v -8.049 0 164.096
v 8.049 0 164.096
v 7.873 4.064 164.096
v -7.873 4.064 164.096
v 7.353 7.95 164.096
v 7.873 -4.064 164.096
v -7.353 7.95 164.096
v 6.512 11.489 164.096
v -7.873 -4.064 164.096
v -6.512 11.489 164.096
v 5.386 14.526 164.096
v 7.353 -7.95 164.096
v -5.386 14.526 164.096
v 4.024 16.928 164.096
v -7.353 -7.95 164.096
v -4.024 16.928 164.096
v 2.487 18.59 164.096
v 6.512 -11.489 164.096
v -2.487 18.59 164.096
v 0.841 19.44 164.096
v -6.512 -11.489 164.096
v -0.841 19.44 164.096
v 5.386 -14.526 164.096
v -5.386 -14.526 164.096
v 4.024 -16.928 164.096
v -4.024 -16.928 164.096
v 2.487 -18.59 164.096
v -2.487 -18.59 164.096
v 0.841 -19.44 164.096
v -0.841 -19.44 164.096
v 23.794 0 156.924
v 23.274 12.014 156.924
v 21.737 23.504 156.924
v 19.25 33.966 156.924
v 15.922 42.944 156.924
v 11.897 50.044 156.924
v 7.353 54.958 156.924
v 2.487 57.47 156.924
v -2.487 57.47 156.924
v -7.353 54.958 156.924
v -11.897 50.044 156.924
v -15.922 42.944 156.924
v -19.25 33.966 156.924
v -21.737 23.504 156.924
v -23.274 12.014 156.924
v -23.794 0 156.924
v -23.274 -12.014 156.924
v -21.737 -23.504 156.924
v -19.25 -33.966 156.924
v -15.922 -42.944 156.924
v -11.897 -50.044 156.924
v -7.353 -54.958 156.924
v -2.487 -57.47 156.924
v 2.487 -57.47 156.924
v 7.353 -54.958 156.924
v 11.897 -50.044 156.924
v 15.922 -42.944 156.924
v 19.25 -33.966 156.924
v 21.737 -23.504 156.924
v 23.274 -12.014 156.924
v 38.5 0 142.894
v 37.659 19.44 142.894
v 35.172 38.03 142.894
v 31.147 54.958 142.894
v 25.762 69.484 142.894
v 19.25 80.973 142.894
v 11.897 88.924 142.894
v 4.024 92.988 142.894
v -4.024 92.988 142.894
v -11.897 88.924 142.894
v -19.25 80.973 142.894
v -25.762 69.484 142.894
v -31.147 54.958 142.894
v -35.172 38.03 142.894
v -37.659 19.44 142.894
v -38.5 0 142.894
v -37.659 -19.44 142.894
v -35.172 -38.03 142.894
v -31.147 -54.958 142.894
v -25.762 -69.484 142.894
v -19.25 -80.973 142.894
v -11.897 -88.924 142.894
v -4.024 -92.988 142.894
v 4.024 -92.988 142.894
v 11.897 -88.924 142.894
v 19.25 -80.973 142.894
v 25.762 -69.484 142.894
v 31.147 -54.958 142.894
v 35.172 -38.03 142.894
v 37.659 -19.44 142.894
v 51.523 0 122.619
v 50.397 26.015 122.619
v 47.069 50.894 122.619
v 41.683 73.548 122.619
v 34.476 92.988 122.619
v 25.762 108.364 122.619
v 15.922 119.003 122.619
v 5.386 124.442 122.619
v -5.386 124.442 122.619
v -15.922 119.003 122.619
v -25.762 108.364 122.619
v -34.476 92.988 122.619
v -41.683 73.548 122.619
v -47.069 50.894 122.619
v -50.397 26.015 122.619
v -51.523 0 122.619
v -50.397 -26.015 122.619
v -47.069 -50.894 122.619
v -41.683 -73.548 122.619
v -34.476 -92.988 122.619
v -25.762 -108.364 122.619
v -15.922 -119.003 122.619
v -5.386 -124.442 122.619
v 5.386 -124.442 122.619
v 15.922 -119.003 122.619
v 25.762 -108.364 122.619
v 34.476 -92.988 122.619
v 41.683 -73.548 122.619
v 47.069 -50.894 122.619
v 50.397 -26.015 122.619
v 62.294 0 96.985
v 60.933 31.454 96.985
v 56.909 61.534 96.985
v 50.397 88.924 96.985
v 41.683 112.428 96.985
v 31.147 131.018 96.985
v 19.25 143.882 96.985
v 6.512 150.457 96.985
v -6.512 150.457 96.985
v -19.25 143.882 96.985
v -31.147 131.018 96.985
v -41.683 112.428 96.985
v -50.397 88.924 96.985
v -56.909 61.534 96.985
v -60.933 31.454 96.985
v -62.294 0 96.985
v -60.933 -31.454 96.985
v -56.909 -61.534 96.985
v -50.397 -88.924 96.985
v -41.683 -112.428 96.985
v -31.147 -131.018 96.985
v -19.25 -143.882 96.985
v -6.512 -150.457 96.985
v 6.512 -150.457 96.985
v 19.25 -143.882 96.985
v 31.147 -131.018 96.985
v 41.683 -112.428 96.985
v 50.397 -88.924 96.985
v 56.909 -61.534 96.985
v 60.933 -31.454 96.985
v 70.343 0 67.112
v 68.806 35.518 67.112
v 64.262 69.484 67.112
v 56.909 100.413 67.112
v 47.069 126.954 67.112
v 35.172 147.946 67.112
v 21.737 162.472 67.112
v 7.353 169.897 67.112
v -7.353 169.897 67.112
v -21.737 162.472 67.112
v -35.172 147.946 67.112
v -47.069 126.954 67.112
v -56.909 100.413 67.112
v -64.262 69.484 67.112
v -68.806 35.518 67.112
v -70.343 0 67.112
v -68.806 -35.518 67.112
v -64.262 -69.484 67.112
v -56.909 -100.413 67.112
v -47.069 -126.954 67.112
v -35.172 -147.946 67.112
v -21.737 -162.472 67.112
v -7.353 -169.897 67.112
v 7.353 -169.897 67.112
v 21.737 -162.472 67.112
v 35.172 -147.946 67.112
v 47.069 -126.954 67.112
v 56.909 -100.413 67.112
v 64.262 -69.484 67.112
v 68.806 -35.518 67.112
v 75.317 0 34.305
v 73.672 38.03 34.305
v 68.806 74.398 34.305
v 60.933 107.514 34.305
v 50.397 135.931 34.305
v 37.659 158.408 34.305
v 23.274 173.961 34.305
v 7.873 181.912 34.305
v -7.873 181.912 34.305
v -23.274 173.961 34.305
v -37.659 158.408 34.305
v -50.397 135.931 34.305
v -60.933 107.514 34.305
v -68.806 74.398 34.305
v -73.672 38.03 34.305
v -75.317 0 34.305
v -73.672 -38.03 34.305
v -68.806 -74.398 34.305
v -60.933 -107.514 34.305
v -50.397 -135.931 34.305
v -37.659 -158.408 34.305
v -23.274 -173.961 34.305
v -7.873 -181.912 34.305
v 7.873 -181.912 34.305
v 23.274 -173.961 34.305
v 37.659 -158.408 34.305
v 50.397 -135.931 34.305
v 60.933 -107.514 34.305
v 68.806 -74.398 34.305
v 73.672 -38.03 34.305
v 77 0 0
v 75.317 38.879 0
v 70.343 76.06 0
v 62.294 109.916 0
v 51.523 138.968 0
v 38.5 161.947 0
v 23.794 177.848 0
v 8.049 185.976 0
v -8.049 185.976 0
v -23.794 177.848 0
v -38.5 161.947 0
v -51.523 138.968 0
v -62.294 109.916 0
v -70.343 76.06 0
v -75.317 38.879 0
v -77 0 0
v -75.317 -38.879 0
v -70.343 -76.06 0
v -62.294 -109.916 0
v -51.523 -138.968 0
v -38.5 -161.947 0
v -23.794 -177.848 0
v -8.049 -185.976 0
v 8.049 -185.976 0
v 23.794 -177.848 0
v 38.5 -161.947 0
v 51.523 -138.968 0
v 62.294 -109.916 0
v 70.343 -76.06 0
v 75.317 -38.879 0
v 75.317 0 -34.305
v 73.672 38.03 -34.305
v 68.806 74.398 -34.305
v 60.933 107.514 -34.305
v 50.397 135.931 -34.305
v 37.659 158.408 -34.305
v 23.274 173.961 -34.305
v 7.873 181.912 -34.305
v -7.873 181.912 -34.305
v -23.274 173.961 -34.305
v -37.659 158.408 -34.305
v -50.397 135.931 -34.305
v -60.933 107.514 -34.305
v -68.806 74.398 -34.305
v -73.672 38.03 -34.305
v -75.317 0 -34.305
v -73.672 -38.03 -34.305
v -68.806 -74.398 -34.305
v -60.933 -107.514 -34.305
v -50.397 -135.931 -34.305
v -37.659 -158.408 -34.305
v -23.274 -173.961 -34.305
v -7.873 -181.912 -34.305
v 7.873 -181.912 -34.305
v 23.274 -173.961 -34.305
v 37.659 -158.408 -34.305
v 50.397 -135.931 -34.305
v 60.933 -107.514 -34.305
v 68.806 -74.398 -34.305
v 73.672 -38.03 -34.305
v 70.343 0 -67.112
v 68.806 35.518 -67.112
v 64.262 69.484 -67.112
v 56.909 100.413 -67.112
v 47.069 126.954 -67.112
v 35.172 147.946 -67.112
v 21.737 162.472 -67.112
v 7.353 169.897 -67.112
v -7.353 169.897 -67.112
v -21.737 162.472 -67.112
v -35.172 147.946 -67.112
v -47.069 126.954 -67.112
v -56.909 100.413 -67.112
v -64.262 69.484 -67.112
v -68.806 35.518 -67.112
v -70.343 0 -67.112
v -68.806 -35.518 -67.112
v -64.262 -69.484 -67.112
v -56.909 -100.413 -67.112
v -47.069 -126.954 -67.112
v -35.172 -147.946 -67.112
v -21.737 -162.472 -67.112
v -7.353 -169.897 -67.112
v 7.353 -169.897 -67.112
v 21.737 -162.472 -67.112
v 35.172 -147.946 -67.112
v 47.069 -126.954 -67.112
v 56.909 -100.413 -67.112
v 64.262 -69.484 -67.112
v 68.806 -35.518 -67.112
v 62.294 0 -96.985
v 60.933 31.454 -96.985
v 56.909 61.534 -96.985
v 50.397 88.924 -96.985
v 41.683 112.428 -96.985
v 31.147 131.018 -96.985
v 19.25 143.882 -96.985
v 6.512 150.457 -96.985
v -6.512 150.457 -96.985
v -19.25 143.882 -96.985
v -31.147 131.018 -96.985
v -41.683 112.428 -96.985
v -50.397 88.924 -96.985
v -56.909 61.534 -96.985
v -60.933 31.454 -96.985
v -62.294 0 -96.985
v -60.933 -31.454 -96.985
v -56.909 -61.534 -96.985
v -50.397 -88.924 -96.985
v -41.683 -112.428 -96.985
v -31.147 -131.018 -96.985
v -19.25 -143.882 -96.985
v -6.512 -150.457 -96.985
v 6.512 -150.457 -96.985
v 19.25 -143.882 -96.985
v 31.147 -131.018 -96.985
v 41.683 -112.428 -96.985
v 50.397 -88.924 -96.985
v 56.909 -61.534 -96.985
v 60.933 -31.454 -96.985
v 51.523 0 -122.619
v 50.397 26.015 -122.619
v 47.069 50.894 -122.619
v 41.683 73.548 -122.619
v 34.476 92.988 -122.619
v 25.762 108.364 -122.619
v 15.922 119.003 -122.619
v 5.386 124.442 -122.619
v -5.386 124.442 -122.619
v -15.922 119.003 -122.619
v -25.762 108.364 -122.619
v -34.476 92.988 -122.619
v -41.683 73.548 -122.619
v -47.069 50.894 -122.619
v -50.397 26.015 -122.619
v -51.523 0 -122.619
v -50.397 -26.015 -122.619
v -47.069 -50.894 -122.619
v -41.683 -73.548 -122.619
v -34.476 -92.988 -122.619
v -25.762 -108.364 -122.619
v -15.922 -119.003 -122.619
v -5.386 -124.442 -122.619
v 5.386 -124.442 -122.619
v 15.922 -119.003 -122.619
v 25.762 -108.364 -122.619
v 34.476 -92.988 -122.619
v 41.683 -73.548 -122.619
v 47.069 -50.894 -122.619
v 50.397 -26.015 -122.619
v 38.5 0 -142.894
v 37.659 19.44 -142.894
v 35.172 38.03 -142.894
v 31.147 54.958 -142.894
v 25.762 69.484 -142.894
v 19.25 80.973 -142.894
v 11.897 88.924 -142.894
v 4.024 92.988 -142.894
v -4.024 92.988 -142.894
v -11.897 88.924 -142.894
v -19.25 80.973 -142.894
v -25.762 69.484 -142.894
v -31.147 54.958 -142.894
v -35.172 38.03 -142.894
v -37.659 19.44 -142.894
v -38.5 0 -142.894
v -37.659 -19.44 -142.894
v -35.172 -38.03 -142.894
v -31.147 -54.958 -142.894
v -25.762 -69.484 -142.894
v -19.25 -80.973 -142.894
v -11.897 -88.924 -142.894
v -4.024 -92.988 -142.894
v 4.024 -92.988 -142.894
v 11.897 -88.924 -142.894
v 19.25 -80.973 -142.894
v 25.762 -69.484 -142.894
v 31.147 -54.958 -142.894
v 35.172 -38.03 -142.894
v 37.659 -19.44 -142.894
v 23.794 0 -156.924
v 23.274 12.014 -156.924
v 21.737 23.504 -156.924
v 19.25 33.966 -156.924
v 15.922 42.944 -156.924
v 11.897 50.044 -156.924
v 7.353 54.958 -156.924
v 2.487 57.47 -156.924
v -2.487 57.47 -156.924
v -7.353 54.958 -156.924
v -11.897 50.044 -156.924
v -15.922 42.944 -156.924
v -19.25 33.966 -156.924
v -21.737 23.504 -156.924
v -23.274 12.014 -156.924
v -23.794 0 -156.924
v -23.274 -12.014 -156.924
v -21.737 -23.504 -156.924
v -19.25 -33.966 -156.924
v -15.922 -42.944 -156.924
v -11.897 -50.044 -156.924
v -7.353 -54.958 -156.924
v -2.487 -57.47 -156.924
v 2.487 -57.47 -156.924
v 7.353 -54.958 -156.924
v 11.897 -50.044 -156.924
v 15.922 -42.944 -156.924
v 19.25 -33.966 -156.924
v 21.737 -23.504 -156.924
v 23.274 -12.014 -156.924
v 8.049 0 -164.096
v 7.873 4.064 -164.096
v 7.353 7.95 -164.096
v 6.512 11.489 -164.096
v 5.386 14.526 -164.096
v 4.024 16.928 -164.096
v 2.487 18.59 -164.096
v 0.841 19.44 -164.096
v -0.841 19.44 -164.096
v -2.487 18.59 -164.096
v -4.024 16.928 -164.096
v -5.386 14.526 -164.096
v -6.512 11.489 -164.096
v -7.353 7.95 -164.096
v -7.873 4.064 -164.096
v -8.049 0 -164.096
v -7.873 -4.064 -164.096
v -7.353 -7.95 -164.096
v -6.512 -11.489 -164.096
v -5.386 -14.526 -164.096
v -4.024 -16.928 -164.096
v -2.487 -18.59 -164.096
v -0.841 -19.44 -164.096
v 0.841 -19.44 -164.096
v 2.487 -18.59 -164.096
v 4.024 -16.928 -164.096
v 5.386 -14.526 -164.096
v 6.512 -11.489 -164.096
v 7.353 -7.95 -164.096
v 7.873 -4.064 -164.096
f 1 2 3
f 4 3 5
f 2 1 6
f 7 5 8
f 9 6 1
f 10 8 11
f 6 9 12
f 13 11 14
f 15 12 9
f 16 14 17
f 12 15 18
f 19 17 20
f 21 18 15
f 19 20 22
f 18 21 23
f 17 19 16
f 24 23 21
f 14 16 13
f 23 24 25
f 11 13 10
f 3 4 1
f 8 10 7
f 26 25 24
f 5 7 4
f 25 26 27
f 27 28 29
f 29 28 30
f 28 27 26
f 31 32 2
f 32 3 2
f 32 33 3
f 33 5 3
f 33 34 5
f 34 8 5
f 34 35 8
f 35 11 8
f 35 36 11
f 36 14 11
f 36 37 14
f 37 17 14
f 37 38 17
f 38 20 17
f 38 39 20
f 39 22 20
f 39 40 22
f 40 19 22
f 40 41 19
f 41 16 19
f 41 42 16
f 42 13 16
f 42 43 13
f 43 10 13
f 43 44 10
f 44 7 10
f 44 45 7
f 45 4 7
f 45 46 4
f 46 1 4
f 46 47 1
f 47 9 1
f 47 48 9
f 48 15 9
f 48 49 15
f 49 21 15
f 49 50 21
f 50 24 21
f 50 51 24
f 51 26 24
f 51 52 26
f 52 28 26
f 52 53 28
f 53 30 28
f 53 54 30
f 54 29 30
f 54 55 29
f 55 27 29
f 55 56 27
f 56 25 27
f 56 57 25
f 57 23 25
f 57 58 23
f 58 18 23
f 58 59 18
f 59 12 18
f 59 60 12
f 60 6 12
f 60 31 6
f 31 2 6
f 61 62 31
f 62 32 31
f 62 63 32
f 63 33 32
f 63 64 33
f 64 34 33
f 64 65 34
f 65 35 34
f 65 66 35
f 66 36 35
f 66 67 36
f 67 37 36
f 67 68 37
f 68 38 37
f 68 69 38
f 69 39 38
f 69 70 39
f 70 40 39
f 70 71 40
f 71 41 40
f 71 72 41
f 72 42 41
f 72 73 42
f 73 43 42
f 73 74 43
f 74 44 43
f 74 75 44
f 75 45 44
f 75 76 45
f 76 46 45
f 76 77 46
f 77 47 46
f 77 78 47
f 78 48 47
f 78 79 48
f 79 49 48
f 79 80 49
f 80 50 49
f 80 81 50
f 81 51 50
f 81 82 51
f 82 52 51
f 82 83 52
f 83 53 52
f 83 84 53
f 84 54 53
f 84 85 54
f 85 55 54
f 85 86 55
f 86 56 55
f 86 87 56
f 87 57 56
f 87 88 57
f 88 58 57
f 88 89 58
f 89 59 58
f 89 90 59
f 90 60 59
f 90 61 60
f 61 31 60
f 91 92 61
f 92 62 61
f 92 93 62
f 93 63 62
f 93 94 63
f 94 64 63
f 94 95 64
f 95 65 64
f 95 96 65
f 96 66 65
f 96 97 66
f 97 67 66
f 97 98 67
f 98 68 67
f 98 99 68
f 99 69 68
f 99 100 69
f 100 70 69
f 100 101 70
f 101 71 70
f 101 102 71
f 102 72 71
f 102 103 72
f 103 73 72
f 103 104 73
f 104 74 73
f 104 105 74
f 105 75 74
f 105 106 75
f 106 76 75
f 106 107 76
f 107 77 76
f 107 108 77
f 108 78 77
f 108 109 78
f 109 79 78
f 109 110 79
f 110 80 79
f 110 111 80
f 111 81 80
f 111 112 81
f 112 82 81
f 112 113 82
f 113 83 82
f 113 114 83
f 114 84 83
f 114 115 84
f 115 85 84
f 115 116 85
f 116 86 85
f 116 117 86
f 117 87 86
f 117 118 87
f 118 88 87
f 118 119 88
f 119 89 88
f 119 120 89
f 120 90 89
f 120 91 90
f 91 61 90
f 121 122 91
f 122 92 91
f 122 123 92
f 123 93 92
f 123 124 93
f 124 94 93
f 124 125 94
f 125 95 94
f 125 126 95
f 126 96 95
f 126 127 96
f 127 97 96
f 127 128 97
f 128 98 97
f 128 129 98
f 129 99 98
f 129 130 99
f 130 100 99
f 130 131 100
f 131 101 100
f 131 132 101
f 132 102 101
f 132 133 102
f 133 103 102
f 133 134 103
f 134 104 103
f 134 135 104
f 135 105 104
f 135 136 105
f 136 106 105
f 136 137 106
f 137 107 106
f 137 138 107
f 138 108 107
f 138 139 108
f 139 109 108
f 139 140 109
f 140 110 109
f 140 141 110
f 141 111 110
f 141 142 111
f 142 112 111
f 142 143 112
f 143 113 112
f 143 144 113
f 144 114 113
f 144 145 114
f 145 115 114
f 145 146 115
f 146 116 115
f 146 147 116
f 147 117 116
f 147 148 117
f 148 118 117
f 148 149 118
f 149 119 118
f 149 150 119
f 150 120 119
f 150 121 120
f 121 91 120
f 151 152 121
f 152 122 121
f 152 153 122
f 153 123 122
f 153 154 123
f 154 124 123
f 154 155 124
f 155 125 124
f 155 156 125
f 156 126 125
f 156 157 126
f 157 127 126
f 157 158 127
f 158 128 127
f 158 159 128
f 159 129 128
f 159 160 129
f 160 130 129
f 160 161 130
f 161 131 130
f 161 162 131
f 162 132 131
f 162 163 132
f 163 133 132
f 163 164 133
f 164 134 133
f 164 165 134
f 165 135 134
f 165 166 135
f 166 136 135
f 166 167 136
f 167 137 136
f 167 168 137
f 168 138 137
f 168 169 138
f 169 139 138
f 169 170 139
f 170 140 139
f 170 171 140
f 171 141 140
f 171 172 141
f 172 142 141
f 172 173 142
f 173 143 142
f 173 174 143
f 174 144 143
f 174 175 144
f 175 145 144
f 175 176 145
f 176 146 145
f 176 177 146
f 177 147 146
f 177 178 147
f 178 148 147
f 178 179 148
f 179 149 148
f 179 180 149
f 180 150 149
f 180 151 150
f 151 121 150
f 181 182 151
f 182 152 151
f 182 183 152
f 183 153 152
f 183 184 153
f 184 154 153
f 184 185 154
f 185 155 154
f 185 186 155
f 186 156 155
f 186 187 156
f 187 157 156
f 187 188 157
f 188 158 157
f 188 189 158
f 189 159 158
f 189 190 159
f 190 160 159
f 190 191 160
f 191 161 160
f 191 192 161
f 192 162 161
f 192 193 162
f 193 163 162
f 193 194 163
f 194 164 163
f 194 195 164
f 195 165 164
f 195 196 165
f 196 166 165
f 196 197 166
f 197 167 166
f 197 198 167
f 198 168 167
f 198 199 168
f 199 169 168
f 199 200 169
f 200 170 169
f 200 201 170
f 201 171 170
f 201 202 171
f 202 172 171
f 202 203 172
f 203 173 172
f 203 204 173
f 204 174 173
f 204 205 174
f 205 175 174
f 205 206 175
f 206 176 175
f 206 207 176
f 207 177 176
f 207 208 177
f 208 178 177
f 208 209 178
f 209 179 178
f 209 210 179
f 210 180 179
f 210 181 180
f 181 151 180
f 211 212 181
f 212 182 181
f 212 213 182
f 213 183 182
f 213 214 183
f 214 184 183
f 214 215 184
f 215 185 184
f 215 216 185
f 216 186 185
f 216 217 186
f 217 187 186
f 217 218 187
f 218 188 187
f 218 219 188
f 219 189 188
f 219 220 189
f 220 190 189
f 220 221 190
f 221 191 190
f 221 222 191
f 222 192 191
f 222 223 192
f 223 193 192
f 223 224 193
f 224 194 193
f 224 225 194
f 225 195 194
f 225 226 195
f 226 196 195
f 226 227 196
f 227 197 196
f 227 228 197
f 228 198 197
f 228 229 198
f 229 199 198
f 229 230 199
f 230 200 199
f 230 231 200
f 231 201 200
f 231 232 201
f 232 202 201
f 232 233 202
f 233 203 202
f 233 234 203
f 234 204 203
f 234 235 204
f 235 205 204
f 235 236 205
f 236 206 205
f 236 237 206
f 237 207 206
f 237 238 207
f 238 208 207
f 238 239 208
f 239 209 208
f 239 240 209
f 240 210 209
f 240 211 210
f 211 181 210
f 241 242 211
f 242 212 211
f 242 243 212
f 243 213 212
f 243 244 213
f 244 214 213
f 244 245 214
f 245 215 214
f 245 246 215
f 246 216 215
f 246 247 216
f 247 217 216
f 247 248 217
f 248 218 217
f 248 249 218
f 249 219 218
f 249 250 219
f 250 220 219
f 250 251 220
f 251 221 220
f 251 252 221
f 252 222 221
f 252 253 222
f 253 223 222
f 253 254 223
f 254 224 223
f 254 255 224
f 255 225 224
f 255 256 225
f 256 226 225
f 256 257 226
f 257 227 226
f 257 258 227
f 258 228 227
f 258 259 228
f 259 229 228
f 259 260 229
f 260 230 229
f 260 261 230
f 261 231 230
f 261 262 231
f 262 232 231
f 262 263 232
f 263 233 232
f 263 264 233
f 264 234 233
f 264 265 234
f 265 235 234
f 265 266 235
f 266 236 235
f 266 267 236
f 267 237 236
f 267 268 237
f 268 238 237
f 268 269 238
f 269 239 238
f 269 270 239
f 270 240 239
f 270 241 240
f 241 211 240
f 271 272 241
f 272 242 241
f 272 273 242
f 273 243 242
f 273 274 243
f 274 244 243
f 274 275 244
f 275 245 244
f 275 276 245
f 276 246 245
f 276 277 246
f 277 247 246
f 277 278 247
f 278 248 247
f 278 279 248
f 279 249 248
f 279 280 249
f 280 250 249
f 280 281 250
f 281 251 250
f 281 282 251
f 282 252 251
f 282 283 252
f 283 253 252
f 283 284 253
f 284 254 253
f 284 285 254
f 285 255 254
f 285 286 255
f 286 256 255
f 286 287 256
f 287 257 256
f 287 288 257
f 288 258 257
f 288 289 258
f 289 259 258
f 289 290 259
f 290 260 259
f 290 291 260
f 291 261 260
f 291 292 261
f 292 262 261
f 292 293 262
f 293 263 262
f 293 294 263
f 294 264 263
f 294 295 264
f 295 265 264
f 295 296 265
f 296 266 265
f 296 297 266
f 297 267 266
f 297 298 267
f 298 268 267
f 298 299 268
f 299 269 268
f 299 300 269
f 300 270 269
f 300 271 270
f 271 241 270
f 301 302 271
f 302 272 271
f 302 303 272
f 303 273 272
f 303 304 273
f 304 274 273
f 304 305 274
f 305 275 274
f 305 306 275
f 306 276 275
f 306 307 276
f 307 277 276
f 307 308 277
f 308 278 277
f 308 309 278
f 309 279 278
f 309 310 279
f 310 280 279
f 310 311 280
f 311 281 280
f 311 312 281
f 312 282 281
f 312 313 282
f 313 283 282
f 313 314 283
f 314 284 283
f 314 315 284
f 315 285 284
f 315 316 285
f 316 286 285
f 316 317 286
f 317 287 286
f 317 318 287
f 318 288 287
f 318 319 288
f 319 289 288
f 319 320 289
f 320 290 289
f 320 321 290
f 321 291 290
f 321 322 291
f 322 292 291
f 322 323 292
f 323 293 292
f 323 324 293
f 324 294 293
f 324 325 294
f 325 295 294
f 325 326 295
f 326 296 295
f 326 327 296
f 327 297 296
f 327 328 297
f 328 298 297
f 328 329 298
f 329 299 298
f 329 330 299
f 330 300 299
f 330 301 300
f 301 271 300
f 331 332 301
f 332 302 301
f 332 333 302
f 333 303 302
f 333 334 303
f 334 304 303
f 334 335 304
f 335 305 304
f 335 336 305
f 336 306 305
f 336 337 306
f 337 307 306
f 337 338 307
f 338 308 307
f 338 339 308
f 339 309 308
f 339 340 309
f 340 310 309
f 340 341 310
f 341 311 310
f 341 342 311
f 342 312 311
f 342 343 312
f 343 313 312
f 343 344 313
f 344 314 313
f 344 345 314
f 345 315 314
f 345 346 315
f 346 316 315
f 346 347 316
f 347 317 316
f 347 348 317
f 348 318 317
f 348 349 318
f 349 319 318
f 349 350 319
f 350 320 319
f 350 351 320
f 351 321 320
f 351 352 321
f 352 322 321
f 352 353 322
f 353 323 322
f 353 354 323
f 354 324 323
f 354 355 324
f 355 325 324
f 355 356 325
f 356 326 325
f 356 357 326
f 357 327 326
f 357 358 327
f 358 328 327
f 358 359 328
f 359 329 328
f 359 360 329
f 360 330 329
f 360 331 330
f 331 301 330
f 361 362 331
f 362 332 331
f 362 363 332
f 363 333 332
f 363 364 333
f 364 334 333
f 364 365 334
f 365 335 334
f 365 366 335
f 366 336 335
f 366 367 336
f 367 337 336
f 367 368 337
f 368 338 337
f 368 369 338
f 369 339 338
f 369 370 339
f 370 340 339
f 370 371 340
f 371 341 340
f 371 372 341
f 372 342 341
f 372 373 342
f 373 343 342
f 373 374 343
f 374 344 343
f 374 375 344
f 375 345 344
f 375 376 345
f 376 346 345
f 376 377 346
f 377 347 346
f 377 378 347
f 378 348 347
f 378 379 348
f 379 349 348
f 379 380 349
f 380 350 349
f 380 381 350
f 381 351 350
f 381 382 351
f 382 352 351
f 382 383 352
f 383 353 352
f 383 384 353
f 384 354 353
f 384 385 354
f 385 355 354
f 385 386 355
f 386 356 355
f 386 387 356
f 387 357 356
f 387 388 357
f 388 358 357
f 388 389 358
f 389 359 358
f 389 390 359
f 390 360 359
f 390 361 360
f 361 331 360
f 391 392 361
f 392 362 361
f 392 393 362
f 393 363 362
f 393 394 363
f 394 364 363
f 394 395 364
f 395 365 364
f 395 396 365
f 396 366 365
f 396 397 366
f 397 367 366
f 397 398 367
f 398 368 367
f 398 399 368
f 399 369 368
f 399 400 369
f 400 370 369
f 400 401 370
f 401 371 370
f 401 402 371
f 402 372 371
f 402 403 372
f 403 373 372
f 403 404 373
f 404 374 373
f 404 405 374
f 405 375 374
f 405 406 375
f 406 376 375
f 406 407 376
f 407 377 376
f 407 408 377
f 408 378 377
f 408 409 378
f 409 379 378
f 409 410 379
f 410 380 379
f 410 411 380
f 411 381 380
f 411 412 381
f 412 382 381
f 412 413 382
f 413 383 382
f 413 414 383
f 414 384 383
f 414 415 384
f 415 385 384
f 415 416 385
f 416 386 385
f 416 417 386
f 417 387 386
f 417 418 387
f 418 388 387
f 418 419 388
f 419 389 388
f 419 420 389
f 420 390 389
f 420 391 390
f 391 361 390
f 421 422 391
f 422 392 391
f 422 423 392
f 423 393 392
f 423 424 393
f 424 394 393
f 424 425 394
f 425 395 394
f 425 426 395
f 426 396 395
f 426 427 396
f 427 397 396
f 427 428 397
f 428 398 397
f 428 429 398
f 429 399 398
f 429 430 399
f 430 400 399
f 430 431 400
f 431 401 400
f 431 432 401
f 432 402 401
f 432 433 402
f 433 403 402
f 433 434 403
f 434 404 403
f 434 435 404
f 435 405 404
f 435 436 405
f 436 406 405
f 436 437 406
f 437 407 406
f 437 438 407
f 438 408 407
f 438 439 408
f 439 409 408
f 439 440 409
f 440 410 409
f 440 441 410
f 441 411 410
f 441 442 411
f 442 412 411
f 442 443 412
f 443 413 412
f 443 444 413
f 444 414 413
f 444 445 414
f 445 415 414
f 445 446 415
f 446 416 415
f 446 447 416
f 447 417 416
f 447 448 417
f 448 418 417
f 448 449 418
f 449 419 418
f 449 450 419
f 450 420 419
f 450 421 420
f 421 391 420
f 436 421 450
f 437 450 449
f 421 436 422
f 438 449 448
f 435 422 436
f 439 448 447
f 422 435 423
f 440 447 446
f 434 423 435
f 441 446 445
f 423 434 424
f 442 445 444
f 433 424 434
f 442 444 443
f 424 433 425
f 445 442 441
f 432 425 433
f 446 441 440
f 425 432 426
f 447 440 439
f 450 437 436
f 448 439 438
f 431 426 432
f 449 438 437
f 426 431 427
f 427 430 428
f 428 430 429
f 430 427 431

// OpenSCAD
// Generated by SolidPython 1.0.1 on 2020-07-29 00:46:48


scale(v = [7, 17, 15]) {
	sphere(r = 11);
}
/***********************************************
*********      SolidPython code:      **********
************************************************
 
# import packages: SolidPython
from solid import *
from solid.utils import *
from itertools import chain, combinations, permutations


class Resize:

    def __init__(self, scad_file):
        self.scad_file = scad_file
        #self.scad_file = import_scad(scad_file)
        # cone/cylinder param:
        self.r1 = 0
        self.r2 = 0
        self.h = 0
        # rectangular prism param:
        self.w = 0
        self.l = 0
        # ellipse param:
        self.r = 0

    # import OpenScad code (file name corresponds to shape)


    # classify shape + parameters
    def assign(self, param1, param2, param3):
        if self.scad_file == 'cone.scad':
            self.r1 = param1
            self.r2 = param2
            self.h = param3
        elif self.scad_file == 'cylinder.scad':
            self.r1 = param1
            self.r2 = param2
            self.h = param3
        elif self.scad_file == 'rectangularPrism.scad':
            self.h = param1
            self.l = param2
            self.w = param3
        else:
            self.r = param1
            self.h = param2

    # resize parameters
    def iterate(self):
        x = range(3, 20, 2)
        i = 1
        if self.scad_file == 'cone.scad':
            tempList = list(permutations(x, 2))
            for temp in tempList:
                param1 = temp[0]
                param2 = temp[1]
                filepath = 'produced_scad_files/' + 'cone' + str(param1) + '_' + str(param2) + '_' + '.scad'
                scad_render_to_file(cylinder(h=param1, r1=param2, r2=0), filepath)

        elif self.scad_file == 'cylinder.scad':
            tempList = list(permutations(x, 3))
            for temp in tempList:
                param1 = temp[0]
                param2 = temp[1]
                filepath = 'produced_scad_files/' + 'cylinder' + str(param1) + '_' + str(param2) + '_' + '.scad'
                scad_render_to_file(cylinder(h=param1, r1=param2, r2=param2), filepath)

        elif self.scad_file == 'rectangularPrism.scad':
            tempList = list(permutations(x, 3))
            for temp in tempList:
                param1 = temp[0]
                param2 = temp[1]
                param3 = temp[2]
                filepath = 'produced_scad_files/' + 'rectangularPrism' + str(param1) + '_' + str(param2) + '_' + str(
                    param3) + '.scad'
                scad_render_to_file(cube(size=(param1, param2, param3)), filepath)

        elif self.scad_file == 'ellipse.scad':
            tempList = list(permutations(x, 4))
            for temp in tempList:
                param1 = temp[0]
                param2 = temp[1]
                param3 = temp[2]
                param4 = temp[3]
                filepath = 'produced_scad_files/' + 'ellipse' + str(param1) + '_' + str(param2) + '_' + str(param3) + '_' + str(param4) + '.scad'
                scad_render_to_file(scale([param1, param2, param3])(sphere(r=param4)), filepath)

    def render_to_scadfile(self):
        scad_render_to_file(scad, 'example.scad') 
 
************************************************/
